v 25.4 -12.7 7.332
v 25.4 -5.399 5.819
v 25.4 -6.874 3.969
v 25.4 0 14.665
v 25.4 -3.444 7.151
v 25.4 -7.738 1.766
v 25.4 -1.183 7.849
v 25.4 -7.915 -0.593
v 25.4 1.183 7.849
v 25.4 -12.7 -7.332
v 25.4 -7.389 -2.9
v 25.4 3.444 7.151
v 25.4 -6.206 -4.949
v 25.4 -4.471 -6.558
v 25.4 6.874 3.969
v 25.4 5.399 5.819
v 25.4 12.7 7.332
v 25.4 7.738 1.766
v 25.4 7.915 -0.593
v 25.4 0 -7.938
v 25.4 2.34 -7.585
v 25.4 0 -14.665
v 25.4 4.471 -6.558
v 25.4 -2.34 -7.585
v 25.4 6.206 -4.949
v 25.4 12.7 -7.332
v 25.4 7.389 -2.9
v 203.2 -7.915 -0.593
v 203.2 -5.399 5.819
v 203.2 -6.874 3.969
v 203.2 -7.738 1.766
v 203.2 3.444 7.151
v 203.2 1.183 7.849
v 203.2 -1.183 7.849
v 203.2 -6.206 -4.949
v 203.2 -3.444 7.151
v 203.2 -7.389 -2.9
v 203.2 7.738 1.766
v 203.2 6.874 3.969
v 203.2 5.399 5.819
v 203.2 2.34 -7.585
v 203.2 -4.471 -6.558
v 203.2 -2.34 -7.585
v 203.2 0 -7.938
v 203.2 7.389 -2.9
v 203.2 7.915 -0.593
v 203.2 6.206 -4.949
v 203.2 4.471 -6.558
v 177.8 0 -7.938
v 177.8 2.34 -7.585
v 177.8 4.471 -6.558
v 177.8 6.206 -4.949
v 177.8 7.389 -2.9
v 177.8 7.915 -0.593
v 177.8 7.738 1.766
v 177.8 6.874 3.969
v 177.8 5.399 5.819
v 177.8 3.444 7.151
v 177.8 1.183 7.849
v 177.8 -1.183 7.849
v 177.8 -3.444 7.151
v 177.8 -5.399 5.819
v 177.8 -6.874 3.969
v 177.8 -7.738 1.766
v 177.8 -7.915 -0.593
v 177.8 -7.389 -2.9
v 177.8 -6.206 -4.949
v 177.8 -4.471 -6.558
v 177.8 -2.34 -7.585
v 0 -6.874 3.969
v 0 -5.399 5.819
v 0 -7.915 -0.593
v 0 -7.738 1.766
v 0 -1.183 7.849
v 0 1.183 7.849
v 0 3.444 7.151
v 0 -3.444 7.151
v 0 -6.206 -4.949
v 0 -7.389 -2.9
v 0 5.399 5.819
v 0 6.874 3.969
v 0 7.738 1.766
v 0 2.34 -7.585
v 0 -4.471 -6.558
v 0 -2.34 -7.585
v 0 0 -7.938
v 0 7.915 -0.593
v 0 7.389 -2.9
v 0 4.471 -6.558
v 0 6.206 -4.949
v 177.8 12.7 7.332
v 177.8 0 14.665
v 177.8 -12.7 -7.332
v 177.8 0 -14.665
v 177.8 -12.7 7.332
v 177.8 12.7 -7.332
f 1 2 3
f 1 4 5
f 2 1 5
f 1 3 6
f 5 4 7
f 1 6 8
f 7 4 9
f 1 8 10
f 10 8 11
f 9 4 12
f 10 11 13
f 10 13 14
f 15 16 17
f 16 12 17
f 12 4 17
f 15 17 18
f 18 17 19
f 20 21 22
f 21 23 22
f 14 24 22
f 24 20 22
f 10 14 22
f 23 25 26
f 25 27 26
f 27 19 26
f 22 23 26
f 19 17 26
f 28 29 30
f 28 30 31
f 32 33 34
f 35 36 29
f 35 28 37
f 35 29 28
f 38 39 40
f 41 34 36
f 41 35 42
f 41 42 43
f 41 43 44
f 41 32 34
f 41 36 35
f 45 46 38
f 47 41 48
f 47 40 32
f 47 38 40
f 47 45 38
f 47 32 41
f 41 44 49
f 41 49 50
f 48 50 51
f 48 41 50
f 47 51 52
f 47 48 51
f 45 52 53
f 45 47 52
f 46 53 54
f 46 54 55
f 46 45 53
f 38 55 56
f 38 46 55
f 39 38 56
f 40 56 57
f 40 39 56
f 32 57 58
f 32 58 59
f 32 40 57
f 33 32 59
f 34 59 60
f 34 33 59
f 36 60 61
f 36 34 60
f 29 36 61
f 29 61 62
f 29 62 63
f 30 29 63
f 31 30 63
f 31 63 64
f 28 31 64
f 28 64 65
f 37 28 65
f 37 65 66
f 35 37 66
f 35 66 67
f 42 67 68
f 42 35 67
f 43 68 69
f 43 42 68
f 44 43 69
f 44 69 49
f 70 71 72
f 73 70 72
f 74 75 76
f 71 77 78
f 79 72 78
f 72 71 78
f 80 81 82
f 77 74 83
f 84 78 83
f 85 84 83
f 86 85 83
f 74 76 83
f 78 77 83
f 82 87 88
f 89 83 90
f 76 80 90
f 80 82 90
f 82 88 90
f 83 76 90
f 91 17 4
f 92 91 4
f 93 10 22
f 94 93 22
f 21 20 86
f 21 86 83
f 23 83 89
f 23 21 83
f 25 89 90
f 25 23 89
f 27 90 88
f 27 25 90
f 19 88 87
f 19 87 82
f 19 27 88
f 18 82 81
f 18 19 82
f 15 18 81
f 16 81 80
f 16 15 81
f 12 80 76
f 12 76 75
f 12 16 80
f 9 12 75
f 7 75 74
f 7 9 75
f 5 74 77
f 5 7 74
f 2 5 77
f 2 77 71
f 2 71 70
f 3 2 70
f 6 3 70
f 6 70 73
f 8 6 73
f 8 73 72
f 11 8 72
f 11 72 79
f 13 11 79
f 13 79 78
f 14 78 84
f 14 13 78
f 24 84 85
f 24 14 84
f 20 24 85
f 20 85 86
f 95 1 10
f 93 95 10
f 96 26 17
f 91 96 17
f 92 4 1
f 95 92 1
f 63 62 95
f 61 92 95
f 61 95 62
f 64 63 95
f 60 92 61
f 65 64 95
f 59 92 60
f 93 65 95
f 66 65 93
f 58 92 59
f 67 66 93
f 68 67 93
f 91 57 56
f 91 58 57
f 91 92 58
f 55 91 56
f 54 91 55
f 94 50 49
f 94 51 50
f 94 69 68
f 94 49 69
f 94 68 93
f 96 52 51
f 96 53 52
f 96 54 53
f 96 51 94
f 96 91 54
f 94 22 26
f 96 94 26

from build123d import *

# Parameters (mm, degrees)
BOSS_EXTRUDE1_DEPTH = 203.2
SKETCH2_OUTSIDE_W   = 72.704
SKETCH2_OUTSIDE_H   = 68.774
SKETCH2_OUTSIDE_R   = 7.9375
CUT_EXTRUDE1_DEPTH  = 25.4
CUT_EXTRUDE3_START  = -177.8
SKETCH2_2_OUTSIDE_W = 72.704
SKETCH2_2_OUTSIDE_H = 68.774
SKETCH2_2_OUTSIDE_R = 7.9375
CUT_EXTRUDE3_DEPTH  = 25.4


with BuildPart() as part:
    # Sketch1 → Boss-Extrude1 (new body)
    with BuildSketch(Plane(origin=(0, 0, 0), x_dir=(0, 0, -1), z_dir=(1, 0, 0))):
        Polygon((14.664696837, 0), (7.332348419, 12.7), (-7.332348419, 12.7), (-14.664696837, 0), (-7.332348419, -12.7), (7.332348419, -12.7), align=None)
    extrude(amount=BOSS_EXTRUDE1_DEPTH)

    # Sketch2 outside → Cut-Extrude1 (cut)
    with BuildSketch(Plane(origin=(203.2, 0, 0), x_dir=(0, 0, -1), z_dir=(1, 0, 0))):
        Rectangle(SKETCH2_OUTSIDE_W, SKETCH2_OUTSIDE_H)
        Circle(SKETCH2_OUTSIDE_R, mode=Mode.SUBTRACT)
    extrude(amount=-CUT_EXTRUDE1_DEPTH, mode=Mode.SUBTRACT)

    # Sketch2<2> outside → Cut-Extrude3 (cut)
    with BuildSketch(Plane(origin=(203.2, 0, 0), x_dir=(0, 0, -1), z_dir=(1, 0, 0)).offset(CUT_EXTRUDE3_START)):
        Rectangle(SKETCH2_2_OUTSIDE_W, SKETCH2_2_OUTSIDE_H)
        Circle(SKETCH2_2_OUTSIDE_R, mode=Mode.SUBTRACT)
    extrude(amount=-CUT_EXTRUDE3_DEPTH, mode=Mode.SUBTRACT)


solid = part.part
